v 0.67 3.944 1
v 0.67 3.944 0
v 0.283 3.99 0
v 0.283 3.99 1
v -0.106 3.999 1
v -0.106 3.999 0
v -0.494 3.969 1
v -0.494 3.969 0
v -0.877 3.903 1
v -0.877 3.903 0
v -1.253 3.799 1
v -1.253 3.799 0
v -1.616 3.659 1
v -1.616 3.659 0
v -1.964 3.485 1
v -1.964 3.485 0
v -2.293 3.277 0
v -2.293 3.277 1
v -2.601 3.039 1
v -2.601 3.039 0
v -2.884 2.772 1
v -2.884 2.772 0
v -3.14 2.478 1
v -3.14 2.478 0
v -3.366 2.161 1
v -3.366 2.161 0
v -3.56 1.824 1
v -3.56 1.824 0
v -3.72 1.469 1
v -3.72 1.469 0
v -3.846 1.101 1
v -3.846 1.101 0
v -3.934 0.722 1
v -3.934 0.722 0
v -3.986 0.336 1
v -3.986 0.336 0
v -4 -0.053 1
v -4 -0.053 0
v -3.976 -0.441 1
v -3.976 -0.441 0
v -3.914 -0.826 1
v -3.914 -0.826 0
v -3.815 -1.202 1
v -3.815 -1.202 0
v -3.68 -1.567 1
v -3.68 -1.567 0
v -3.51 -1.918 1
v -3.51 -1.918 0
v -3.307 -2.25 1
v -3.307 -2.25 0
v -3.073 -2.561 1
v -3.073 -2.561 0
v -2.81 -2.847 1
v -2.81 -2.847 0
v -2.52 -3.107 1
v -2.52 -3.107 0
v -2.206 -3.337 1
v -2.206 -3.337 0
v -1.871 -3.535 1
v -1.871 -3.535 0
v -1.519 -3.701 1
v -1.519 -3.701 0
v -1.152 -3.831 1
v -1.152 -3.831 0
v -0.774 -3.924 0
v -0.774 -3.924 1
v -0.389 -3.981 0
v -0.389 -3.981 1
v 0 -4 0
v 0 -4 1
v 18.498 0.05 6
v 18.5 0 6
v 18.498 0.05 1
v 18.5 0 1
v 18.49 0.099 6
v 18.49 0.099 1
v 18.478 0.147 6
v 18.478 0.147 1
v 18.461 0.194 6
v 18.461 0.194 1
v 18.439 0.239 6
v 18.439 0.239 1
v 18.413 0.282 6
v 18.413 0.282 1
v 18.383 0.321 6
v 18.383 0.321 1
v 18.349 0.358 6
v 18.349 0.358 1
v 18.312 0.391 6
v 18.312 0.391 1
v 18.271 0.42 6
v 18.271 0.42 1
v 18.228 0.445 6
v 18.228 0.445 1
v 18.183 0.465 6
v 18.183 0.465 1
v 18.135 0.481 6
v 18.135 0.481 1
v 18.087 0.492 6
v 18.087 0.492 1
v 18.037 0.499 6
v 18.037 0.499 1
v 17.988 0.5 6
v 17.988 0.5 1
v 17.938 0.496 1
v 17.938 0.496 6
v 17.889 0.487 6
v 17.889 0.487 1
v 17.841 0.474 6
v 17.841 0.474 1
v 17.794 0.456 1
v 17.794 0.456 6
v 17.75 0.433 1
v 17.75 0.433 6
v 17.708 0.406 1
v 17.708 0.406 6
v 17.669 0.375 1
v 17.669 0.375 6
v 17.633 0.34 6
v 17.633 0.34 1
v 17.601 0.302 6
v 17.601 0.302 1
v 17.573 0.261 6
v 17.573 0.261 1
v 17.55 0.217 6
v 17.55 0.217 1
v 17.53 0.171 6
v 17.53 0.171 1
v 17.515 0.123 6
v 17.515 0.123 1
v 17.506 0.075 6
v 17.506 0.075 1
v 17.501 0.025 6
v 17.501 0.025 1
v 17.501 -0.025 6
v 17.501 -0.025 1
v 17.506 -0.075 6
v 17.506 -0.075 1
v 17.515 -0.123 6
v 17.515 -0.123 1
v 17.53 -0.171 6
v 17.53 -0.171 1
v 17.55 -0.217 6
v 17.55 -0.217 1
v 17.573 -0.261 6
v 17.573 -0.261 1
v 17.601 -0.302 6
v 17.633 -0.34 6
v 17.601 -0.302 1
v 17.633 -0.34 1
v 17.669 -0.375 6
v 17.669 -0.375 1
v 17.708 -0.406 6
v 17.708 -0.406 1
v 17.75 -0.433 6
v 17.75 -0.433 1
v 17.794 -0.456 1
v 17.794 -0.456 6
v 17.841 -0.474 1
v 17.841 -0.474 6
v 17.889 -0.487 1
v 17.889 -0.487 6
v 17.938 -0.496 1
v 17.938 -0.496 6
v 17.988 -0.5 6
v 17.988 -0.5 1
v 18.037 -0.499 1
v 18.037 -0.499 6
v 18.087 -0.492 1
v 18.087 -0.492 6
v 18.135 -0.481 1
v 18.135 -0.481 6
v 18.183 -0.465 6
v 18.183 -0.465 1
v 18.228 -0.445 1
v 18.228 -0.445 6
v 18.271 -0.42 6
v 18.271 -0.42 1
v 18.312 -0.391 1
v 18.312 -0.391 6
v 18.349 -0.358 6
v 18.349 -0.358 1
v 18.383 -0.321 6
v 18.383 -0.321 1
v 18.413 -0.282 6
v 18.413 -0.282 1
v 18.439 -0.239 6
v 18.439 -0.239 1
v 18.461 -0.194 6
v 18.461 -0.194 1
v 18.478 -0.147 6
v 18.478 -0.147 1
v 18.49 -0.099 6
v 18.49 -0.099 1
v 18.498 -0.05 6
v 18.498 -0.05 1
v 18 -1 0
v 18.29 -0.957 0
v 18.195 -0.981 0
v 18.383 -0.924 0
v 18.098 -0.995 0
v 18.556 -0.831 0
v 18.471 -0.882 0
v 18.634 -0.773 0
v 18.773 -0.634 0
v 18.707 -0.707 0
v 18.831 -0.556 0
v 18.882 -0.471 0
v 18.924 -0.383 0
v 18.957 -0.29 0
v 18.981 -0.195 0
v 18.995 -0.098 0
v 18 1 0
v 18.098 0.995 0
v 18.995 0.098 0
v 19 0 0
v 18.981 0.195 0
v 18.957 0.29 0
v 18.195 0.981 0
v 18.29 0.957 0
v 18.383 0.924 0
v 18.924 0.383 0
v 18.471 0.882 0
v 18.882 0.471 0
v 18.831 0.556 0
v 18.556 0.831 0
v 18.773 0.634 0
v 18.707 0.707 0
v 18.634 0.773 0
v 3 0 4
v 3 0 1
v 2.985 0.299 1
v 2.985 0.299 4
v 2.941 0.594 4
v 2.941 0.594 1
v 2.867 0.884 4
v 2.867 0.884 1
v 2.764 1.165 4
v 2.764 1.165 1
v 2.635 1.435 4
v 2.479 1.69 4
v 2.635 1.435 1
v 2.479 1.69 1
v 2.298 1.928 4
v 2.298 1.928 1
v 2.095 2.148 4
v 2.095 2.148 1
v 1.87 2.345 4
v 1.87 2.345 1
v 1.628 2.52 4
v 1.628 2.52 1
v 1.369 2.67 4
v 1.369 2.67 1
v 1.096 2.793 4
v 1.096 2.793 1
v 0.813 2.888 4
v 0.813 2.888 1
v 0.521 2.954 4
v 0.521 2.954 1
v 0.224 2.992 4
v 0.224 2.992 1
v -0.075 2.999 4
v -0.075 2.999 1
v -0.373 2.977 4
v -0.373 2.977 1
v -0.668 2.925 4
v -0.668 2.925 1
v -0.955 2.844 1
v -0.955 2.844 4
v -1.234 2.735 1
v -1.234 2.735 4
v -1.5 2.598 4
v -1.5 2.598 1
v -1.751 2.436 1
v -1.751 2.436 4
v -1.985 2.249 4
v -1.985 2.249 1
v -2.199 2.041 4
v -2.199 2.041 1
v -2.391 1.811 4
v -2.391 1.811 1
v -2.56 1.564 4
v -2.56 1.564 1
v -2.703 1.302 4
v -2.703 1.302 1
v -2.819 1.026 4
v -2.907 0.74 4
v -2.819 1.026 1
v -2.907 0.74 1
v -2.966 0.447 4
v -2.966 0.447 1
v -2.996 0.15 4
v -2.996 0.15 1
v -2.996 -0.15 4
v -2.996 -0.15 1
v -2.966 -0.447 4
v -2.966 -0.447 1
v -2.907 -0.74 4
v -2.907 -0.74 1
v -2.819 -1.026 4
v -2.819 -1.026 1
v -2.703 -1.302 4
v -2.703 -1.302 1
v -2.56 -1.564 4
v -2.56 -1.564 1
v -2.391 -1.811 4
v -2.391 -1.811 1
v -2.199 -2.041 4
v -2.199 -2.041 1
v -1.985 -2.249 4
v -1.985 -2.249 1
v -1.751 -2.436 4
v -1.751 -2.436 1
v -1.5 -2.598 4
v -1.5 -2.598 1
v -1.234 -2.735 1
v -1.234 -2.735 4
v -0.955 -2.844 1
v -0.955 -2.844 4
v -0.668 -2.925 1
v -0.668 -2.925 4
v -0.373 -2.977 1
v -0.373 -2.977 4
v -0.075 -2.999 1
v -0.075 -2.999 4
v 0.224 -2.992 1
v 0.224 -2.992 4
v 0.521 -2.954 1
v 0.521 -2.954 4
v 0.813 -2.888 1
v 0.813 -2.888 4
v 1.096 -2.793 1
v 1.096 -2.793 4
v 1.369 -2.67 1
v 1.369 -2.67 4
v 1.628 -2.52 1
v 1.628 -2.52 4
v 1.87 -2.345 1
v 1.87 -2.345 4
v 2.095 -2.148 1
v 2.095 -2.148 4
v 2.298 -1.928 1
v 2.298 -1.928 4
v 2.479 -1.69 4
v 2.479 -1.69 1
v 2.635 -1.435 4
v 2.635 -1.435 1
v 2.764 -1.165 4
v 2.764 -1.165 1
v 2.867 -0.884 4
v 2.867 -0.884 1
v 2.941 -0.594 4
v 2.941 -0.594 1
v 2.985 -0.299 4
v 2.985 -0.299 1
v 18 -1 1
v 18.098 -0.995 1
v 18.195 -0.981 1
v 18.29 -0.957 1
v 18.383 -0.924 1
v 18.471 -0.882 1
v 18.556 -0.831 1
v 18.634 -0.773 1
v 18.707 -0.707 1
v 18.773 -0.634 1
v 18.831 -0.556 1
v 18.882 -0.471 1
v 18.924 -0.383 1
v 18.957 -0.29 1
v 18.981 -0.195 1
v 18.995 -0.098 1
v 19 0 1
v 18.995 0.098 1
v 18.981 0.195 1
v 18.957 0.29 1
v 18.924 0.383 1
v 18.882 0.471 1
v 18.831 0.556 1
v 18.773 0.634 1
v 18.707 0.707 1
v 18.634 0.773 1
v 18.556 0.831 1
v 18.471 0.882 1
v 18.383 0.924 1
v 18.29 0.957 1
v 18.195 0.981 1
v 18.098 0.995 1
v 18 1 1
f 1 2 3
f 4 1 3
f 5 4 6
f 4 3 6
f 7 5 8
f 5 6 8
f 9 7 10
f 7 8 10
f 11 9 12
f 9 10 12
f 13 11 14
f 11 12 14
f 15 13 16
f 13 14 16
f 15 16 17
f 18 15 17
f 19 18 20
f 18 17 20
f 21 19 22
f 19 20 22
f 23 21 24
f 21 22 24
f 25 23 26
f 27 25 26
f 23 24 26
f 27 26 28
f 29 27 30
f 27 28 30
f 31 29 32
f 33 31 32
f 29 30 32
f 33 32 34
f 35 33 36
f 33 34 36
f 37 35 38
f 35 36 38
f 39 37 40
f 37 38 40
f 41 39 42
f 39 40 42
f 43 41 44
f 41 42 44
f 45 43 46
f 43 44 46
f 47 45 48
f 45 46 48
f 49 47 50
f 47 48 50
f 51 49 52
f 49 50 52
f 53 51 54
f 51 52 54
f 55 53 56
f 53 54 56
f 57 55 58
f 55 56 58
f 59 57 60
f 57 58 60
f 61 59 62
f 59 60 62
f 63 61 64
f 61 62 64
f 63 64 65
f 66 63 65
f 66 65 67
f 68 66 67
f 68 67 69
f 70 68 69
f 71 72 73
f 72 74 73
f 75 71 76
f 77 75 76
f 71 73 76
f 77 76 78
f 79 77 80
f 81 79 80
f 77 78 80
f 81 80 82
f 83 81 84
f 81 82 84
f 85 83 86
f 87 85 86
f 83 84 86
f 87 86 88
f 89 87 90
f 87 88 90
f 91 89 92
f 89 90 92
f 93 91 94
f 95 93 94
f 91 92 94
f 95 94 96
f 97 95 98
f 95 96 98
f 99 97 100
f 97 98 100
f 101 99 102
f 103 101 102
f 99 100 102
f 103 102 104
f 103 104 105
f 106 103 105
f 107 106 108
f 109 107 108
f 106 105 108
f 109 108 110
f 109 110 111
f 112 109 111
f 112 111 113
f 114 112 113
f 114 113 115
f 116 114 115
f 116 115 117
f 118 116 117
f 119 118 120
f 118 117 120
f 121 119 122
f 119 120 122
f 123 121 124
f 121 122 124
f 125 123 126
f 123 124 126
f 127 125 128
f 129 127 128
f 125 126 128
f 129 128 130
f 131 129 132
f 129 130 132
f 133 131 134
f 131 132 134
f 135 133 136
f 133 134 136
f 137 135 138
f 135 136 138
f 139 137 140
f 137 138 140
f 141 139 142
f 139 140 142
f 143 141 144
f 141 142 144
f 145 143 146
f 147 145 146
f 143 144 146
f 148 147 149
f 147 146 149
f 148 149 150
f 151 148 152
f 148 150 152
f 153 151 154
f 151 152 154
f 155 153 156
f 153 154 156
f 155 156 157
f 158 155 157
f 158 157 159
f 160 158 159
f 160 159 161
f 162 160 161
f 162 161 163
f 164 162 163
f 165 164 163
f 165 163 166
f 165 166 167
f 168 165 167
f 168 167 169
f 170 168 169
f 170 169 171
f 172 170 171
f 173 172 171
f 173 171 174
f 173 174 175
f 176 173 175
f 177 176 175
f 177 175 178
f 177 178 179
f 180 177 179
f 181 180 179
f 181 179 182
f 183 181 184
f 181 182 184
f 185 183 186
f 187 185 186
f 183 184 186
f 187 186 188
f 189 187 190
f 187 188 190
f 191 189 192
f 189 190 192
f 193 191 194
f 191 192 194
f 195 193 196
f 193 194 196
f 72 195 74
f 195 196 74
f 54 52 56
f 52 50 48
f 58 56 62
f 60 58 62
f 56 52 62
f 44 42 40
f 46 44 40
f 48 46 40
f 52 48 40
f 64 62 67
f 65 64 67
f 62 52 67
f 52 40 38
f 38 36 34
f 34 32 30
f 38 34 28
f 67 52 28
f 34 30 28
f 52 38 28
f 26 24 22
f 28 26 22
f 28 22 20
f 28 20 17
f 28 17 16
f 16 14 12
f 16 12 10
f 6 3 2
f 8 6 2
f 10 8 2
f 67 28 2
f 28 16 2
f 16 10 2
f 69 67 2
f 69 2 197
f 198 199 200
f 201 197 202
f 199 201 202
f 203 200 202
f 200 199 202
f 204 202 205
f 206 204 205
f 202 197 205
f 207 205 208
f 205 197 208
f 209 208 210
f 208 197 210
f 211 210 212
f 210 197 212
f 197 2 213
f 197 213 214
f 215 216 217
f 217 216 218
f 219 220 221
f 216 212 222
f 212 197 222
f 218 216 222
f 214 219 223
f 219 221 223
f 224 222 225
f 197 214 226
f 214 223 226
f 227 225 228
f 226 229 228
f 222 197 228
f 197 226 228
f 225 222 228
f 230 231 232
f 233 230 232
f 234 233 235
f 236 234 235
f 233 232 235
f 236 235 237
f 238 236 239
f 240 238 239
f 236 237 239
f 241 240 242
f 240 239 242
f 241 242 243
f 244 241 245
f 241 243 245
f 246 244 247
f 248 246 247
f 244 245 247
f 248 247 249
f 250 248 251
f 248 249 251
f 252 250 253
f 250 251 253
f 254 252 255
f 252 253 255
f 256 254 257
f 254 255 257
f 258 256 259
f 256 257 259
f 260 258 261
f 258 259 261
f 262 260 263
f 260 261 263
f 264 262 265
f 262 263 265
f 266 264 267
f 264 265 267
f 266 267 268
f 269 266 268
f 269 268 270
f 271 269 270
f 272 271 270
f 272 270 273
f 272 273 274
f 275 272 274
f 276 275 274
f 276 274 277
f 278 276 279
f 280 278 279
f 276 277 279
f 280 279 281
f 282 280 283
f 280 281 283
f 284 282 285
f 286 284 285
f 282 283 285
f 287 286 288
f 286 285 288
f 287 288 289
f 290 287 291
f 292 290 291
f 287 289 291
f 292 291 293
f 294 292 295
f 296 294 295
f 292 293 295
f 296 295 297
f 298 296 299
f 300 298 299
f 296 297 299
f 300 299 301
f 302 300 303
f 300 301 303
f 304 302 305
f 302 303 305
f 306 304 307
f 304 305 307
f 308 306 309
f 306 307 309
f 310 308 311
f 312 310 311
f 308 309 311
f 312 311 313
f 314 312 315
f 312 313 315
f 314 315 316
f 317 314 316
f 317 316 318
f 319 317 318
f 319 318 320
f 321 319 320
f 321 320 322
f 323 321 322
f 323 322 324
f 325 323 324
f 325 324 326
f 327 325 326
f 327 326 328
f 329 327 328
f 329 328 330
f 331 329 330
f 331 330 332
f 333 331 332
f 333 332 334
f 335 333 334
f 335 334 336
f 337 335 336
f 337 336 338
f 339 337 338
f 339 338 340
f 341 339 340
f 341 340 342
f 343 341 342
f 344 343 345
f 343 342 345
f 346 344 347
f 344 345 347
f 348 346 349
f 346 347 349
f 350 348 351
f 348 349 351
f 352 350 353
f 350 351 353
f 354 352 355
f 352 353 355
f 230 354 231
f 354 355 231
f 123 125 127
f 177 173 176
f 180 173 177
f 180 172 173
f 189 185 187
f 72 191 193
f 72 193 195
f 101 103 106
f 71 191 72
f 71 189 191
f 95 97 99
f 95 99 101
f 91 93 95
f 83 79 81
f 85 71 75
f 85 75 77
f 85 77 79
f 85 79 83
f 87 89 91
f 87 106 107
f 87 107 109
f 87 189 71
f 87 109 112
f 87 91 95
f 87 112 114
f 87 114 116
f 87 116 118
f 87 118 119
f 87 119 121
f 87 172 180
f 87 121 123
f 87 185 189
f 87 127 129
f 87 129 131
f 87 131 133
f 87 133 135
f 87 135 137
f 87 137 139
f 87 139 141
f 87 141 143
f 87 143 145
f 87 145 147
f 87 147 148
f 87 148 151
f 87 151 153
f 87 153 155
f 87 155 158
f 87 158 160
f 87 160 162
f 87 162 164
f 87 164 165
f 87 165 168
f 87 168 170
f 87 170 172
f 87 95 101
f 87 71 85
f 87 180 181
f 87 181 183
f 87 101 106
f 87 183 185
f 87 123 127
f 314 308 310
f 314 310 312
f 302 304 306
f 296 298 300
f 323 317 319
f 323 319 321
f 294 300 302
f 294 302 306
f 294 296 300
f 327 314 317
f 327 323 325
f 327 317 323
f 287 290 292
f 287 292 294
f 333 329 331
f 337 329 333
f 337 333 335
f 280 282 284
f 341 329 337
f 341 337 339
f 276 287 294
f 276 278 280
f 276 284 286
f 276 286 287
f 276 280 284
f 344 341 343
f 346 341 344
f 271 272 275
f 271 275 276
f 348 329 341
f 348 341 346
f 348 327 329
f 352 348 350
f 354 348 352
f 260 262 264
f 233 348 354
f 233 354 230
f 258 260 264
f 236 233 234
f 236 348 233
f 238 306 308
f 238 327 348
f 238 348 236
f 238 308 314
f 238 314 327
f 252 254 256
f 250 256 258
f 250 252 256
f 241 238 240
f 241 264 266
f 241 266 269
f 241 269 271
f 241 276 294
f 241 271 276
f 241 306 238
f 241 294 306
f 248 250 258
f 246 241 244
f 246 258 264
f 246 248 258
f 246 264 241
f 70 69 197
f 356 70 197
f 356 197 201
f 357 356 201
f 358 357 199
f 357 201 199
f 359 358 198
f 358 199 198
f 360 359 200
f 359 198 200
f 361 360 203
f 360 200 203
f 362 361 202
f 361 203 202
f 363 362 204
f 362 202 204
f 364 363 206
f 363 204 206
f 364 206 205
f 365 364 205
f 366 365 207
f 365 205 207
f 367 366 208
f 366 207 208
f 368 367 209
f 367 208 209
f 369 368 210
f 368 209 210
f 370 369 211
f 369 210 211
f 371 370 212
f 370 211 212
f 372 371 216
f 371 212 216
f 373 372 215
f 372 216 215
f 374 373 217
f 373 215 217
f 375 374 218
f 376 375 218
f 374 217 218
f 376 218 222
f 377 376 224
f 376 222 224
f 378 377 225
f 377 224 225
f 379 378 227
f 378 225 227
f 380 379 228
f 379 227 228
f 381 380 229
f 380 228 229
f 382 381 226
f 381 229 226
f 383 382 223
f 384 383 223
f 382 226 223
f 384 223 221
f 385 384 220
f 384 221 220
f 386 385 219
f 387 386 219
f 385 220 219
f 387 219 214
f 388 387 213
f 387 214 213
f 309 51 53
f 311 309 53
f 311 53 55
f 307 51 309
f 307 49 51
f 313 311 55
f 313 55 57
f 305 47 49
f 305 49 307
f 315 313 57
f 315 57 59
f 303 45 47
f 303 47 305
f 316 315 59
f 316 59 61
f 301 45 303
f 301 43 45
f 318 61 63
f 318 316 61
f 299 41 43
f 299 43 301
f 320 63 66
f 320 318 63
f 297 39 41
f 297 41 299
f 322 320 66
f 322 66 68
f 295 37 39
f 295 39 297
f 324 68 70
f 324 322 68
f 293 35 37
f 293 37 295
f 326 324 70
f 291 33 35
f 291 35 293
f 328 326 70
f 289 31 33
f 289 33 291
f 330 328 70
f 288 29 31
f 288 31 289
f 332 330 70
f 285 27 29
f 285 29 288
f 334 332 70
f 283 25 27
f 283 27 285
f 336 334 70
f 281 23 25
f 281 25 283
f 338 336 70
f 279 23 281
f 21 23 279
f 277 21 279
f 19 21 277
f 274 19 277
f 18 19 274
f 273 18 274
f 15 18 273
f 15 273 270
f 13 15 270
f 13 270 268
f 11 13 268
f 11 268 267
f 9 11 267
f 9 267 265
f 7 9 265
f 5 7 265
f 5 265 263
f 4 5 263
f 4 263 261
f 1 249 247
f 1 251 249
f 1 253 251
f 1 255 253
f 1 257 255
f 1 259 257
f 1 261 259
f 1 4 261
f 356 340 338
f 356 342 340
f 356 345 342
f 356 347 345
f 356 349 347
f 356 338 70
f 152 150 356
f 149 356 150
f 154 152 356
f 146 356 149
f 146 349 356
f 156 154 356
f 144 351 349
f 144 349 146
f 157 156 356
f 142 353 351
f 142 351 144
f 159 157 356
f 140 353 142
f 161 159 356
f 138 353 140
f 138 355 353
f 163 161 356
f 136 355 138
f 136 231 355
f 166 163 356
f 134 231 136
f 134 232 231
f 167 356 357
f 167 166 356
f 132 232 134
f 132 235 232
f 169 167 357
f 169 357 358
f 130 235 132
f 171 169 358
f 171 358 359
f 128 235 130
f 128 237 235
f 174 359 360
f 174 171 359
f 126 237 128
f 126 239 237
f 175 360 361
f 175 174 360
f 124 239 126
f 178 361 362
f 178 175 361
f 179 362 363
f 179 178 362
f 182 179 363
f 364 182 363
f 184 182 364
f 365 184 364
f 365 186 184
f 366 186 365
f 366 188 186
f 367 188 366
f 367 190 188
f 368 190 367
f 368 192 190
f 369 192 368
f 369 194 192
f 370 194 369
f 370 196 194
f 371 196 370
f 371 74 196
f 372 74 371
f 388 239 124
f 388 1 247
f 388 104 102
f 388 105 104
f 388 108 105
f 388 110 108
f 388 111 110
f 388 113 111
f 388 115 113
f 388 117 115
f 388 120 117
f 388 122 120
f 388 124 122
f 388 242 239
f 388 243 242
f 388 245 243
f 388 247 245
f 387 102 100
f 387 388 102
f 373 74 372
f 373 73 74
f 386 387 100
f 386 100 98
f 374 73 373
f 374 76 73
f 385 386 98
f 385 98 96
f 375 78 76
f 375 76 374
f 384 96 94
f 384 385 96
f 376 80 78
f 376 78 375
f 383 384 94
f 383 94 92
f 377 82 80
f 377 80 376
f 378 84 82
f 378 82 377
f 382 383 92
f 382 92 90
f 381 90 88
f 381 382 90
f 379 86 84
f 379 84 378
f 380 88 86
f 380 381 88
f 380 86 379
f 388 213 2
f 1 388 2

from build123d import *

# Parameters (mm, degrees)
BOSS_EXTRUDE1_DEPTH = 1
SKETCH2_R           = 0.5
SKETCH2_R_2         = 3
BOSS_EXTRUDE2_DEPTH = 3
SKETCH3_R           = 0.5
BOSS_EXTRUDE3_DEPTH = 2


with BuildPart() as part:
    # Sketch1 → Boss-Extrude1 (new body)
    with BuildSketch(Plane.XY):
        with BuildLine():
            Line((18, 1), (0.669804359, 3.943521538))
            ThreePointArc((0.669804359, 3.943521538), (-3.985855376, 0.336090648), (0, -4))
            Line((0, -4), (18, -1))
            ThreePointArc((18, -1), (19, 0), (18, 1))
        make_face()
    extrude(amount=BOSS_EXTRUDE1_DEPTH)

    # Sketch2 → Boss-Extrude2 (add)
    with BuildSketch(Plane.XY.offset(1)):
        with Locations((18, 0)):
            Circle(SKETCH2_R)
        Circle(SKETCH2_R_2)
    extrude(amount=BOSS_EXTRUDE2_DEPTH)

    # Sketch3 → Boss-Extrude3 (add)
    with BuildSketch(Plane.XY.offset(4)):
        with Locations((18, 0)):
            Circle(SKETCH3_R)
    extrude(amount=BOSS_EXTRUDE3_DEPTH)


solid = part.part
